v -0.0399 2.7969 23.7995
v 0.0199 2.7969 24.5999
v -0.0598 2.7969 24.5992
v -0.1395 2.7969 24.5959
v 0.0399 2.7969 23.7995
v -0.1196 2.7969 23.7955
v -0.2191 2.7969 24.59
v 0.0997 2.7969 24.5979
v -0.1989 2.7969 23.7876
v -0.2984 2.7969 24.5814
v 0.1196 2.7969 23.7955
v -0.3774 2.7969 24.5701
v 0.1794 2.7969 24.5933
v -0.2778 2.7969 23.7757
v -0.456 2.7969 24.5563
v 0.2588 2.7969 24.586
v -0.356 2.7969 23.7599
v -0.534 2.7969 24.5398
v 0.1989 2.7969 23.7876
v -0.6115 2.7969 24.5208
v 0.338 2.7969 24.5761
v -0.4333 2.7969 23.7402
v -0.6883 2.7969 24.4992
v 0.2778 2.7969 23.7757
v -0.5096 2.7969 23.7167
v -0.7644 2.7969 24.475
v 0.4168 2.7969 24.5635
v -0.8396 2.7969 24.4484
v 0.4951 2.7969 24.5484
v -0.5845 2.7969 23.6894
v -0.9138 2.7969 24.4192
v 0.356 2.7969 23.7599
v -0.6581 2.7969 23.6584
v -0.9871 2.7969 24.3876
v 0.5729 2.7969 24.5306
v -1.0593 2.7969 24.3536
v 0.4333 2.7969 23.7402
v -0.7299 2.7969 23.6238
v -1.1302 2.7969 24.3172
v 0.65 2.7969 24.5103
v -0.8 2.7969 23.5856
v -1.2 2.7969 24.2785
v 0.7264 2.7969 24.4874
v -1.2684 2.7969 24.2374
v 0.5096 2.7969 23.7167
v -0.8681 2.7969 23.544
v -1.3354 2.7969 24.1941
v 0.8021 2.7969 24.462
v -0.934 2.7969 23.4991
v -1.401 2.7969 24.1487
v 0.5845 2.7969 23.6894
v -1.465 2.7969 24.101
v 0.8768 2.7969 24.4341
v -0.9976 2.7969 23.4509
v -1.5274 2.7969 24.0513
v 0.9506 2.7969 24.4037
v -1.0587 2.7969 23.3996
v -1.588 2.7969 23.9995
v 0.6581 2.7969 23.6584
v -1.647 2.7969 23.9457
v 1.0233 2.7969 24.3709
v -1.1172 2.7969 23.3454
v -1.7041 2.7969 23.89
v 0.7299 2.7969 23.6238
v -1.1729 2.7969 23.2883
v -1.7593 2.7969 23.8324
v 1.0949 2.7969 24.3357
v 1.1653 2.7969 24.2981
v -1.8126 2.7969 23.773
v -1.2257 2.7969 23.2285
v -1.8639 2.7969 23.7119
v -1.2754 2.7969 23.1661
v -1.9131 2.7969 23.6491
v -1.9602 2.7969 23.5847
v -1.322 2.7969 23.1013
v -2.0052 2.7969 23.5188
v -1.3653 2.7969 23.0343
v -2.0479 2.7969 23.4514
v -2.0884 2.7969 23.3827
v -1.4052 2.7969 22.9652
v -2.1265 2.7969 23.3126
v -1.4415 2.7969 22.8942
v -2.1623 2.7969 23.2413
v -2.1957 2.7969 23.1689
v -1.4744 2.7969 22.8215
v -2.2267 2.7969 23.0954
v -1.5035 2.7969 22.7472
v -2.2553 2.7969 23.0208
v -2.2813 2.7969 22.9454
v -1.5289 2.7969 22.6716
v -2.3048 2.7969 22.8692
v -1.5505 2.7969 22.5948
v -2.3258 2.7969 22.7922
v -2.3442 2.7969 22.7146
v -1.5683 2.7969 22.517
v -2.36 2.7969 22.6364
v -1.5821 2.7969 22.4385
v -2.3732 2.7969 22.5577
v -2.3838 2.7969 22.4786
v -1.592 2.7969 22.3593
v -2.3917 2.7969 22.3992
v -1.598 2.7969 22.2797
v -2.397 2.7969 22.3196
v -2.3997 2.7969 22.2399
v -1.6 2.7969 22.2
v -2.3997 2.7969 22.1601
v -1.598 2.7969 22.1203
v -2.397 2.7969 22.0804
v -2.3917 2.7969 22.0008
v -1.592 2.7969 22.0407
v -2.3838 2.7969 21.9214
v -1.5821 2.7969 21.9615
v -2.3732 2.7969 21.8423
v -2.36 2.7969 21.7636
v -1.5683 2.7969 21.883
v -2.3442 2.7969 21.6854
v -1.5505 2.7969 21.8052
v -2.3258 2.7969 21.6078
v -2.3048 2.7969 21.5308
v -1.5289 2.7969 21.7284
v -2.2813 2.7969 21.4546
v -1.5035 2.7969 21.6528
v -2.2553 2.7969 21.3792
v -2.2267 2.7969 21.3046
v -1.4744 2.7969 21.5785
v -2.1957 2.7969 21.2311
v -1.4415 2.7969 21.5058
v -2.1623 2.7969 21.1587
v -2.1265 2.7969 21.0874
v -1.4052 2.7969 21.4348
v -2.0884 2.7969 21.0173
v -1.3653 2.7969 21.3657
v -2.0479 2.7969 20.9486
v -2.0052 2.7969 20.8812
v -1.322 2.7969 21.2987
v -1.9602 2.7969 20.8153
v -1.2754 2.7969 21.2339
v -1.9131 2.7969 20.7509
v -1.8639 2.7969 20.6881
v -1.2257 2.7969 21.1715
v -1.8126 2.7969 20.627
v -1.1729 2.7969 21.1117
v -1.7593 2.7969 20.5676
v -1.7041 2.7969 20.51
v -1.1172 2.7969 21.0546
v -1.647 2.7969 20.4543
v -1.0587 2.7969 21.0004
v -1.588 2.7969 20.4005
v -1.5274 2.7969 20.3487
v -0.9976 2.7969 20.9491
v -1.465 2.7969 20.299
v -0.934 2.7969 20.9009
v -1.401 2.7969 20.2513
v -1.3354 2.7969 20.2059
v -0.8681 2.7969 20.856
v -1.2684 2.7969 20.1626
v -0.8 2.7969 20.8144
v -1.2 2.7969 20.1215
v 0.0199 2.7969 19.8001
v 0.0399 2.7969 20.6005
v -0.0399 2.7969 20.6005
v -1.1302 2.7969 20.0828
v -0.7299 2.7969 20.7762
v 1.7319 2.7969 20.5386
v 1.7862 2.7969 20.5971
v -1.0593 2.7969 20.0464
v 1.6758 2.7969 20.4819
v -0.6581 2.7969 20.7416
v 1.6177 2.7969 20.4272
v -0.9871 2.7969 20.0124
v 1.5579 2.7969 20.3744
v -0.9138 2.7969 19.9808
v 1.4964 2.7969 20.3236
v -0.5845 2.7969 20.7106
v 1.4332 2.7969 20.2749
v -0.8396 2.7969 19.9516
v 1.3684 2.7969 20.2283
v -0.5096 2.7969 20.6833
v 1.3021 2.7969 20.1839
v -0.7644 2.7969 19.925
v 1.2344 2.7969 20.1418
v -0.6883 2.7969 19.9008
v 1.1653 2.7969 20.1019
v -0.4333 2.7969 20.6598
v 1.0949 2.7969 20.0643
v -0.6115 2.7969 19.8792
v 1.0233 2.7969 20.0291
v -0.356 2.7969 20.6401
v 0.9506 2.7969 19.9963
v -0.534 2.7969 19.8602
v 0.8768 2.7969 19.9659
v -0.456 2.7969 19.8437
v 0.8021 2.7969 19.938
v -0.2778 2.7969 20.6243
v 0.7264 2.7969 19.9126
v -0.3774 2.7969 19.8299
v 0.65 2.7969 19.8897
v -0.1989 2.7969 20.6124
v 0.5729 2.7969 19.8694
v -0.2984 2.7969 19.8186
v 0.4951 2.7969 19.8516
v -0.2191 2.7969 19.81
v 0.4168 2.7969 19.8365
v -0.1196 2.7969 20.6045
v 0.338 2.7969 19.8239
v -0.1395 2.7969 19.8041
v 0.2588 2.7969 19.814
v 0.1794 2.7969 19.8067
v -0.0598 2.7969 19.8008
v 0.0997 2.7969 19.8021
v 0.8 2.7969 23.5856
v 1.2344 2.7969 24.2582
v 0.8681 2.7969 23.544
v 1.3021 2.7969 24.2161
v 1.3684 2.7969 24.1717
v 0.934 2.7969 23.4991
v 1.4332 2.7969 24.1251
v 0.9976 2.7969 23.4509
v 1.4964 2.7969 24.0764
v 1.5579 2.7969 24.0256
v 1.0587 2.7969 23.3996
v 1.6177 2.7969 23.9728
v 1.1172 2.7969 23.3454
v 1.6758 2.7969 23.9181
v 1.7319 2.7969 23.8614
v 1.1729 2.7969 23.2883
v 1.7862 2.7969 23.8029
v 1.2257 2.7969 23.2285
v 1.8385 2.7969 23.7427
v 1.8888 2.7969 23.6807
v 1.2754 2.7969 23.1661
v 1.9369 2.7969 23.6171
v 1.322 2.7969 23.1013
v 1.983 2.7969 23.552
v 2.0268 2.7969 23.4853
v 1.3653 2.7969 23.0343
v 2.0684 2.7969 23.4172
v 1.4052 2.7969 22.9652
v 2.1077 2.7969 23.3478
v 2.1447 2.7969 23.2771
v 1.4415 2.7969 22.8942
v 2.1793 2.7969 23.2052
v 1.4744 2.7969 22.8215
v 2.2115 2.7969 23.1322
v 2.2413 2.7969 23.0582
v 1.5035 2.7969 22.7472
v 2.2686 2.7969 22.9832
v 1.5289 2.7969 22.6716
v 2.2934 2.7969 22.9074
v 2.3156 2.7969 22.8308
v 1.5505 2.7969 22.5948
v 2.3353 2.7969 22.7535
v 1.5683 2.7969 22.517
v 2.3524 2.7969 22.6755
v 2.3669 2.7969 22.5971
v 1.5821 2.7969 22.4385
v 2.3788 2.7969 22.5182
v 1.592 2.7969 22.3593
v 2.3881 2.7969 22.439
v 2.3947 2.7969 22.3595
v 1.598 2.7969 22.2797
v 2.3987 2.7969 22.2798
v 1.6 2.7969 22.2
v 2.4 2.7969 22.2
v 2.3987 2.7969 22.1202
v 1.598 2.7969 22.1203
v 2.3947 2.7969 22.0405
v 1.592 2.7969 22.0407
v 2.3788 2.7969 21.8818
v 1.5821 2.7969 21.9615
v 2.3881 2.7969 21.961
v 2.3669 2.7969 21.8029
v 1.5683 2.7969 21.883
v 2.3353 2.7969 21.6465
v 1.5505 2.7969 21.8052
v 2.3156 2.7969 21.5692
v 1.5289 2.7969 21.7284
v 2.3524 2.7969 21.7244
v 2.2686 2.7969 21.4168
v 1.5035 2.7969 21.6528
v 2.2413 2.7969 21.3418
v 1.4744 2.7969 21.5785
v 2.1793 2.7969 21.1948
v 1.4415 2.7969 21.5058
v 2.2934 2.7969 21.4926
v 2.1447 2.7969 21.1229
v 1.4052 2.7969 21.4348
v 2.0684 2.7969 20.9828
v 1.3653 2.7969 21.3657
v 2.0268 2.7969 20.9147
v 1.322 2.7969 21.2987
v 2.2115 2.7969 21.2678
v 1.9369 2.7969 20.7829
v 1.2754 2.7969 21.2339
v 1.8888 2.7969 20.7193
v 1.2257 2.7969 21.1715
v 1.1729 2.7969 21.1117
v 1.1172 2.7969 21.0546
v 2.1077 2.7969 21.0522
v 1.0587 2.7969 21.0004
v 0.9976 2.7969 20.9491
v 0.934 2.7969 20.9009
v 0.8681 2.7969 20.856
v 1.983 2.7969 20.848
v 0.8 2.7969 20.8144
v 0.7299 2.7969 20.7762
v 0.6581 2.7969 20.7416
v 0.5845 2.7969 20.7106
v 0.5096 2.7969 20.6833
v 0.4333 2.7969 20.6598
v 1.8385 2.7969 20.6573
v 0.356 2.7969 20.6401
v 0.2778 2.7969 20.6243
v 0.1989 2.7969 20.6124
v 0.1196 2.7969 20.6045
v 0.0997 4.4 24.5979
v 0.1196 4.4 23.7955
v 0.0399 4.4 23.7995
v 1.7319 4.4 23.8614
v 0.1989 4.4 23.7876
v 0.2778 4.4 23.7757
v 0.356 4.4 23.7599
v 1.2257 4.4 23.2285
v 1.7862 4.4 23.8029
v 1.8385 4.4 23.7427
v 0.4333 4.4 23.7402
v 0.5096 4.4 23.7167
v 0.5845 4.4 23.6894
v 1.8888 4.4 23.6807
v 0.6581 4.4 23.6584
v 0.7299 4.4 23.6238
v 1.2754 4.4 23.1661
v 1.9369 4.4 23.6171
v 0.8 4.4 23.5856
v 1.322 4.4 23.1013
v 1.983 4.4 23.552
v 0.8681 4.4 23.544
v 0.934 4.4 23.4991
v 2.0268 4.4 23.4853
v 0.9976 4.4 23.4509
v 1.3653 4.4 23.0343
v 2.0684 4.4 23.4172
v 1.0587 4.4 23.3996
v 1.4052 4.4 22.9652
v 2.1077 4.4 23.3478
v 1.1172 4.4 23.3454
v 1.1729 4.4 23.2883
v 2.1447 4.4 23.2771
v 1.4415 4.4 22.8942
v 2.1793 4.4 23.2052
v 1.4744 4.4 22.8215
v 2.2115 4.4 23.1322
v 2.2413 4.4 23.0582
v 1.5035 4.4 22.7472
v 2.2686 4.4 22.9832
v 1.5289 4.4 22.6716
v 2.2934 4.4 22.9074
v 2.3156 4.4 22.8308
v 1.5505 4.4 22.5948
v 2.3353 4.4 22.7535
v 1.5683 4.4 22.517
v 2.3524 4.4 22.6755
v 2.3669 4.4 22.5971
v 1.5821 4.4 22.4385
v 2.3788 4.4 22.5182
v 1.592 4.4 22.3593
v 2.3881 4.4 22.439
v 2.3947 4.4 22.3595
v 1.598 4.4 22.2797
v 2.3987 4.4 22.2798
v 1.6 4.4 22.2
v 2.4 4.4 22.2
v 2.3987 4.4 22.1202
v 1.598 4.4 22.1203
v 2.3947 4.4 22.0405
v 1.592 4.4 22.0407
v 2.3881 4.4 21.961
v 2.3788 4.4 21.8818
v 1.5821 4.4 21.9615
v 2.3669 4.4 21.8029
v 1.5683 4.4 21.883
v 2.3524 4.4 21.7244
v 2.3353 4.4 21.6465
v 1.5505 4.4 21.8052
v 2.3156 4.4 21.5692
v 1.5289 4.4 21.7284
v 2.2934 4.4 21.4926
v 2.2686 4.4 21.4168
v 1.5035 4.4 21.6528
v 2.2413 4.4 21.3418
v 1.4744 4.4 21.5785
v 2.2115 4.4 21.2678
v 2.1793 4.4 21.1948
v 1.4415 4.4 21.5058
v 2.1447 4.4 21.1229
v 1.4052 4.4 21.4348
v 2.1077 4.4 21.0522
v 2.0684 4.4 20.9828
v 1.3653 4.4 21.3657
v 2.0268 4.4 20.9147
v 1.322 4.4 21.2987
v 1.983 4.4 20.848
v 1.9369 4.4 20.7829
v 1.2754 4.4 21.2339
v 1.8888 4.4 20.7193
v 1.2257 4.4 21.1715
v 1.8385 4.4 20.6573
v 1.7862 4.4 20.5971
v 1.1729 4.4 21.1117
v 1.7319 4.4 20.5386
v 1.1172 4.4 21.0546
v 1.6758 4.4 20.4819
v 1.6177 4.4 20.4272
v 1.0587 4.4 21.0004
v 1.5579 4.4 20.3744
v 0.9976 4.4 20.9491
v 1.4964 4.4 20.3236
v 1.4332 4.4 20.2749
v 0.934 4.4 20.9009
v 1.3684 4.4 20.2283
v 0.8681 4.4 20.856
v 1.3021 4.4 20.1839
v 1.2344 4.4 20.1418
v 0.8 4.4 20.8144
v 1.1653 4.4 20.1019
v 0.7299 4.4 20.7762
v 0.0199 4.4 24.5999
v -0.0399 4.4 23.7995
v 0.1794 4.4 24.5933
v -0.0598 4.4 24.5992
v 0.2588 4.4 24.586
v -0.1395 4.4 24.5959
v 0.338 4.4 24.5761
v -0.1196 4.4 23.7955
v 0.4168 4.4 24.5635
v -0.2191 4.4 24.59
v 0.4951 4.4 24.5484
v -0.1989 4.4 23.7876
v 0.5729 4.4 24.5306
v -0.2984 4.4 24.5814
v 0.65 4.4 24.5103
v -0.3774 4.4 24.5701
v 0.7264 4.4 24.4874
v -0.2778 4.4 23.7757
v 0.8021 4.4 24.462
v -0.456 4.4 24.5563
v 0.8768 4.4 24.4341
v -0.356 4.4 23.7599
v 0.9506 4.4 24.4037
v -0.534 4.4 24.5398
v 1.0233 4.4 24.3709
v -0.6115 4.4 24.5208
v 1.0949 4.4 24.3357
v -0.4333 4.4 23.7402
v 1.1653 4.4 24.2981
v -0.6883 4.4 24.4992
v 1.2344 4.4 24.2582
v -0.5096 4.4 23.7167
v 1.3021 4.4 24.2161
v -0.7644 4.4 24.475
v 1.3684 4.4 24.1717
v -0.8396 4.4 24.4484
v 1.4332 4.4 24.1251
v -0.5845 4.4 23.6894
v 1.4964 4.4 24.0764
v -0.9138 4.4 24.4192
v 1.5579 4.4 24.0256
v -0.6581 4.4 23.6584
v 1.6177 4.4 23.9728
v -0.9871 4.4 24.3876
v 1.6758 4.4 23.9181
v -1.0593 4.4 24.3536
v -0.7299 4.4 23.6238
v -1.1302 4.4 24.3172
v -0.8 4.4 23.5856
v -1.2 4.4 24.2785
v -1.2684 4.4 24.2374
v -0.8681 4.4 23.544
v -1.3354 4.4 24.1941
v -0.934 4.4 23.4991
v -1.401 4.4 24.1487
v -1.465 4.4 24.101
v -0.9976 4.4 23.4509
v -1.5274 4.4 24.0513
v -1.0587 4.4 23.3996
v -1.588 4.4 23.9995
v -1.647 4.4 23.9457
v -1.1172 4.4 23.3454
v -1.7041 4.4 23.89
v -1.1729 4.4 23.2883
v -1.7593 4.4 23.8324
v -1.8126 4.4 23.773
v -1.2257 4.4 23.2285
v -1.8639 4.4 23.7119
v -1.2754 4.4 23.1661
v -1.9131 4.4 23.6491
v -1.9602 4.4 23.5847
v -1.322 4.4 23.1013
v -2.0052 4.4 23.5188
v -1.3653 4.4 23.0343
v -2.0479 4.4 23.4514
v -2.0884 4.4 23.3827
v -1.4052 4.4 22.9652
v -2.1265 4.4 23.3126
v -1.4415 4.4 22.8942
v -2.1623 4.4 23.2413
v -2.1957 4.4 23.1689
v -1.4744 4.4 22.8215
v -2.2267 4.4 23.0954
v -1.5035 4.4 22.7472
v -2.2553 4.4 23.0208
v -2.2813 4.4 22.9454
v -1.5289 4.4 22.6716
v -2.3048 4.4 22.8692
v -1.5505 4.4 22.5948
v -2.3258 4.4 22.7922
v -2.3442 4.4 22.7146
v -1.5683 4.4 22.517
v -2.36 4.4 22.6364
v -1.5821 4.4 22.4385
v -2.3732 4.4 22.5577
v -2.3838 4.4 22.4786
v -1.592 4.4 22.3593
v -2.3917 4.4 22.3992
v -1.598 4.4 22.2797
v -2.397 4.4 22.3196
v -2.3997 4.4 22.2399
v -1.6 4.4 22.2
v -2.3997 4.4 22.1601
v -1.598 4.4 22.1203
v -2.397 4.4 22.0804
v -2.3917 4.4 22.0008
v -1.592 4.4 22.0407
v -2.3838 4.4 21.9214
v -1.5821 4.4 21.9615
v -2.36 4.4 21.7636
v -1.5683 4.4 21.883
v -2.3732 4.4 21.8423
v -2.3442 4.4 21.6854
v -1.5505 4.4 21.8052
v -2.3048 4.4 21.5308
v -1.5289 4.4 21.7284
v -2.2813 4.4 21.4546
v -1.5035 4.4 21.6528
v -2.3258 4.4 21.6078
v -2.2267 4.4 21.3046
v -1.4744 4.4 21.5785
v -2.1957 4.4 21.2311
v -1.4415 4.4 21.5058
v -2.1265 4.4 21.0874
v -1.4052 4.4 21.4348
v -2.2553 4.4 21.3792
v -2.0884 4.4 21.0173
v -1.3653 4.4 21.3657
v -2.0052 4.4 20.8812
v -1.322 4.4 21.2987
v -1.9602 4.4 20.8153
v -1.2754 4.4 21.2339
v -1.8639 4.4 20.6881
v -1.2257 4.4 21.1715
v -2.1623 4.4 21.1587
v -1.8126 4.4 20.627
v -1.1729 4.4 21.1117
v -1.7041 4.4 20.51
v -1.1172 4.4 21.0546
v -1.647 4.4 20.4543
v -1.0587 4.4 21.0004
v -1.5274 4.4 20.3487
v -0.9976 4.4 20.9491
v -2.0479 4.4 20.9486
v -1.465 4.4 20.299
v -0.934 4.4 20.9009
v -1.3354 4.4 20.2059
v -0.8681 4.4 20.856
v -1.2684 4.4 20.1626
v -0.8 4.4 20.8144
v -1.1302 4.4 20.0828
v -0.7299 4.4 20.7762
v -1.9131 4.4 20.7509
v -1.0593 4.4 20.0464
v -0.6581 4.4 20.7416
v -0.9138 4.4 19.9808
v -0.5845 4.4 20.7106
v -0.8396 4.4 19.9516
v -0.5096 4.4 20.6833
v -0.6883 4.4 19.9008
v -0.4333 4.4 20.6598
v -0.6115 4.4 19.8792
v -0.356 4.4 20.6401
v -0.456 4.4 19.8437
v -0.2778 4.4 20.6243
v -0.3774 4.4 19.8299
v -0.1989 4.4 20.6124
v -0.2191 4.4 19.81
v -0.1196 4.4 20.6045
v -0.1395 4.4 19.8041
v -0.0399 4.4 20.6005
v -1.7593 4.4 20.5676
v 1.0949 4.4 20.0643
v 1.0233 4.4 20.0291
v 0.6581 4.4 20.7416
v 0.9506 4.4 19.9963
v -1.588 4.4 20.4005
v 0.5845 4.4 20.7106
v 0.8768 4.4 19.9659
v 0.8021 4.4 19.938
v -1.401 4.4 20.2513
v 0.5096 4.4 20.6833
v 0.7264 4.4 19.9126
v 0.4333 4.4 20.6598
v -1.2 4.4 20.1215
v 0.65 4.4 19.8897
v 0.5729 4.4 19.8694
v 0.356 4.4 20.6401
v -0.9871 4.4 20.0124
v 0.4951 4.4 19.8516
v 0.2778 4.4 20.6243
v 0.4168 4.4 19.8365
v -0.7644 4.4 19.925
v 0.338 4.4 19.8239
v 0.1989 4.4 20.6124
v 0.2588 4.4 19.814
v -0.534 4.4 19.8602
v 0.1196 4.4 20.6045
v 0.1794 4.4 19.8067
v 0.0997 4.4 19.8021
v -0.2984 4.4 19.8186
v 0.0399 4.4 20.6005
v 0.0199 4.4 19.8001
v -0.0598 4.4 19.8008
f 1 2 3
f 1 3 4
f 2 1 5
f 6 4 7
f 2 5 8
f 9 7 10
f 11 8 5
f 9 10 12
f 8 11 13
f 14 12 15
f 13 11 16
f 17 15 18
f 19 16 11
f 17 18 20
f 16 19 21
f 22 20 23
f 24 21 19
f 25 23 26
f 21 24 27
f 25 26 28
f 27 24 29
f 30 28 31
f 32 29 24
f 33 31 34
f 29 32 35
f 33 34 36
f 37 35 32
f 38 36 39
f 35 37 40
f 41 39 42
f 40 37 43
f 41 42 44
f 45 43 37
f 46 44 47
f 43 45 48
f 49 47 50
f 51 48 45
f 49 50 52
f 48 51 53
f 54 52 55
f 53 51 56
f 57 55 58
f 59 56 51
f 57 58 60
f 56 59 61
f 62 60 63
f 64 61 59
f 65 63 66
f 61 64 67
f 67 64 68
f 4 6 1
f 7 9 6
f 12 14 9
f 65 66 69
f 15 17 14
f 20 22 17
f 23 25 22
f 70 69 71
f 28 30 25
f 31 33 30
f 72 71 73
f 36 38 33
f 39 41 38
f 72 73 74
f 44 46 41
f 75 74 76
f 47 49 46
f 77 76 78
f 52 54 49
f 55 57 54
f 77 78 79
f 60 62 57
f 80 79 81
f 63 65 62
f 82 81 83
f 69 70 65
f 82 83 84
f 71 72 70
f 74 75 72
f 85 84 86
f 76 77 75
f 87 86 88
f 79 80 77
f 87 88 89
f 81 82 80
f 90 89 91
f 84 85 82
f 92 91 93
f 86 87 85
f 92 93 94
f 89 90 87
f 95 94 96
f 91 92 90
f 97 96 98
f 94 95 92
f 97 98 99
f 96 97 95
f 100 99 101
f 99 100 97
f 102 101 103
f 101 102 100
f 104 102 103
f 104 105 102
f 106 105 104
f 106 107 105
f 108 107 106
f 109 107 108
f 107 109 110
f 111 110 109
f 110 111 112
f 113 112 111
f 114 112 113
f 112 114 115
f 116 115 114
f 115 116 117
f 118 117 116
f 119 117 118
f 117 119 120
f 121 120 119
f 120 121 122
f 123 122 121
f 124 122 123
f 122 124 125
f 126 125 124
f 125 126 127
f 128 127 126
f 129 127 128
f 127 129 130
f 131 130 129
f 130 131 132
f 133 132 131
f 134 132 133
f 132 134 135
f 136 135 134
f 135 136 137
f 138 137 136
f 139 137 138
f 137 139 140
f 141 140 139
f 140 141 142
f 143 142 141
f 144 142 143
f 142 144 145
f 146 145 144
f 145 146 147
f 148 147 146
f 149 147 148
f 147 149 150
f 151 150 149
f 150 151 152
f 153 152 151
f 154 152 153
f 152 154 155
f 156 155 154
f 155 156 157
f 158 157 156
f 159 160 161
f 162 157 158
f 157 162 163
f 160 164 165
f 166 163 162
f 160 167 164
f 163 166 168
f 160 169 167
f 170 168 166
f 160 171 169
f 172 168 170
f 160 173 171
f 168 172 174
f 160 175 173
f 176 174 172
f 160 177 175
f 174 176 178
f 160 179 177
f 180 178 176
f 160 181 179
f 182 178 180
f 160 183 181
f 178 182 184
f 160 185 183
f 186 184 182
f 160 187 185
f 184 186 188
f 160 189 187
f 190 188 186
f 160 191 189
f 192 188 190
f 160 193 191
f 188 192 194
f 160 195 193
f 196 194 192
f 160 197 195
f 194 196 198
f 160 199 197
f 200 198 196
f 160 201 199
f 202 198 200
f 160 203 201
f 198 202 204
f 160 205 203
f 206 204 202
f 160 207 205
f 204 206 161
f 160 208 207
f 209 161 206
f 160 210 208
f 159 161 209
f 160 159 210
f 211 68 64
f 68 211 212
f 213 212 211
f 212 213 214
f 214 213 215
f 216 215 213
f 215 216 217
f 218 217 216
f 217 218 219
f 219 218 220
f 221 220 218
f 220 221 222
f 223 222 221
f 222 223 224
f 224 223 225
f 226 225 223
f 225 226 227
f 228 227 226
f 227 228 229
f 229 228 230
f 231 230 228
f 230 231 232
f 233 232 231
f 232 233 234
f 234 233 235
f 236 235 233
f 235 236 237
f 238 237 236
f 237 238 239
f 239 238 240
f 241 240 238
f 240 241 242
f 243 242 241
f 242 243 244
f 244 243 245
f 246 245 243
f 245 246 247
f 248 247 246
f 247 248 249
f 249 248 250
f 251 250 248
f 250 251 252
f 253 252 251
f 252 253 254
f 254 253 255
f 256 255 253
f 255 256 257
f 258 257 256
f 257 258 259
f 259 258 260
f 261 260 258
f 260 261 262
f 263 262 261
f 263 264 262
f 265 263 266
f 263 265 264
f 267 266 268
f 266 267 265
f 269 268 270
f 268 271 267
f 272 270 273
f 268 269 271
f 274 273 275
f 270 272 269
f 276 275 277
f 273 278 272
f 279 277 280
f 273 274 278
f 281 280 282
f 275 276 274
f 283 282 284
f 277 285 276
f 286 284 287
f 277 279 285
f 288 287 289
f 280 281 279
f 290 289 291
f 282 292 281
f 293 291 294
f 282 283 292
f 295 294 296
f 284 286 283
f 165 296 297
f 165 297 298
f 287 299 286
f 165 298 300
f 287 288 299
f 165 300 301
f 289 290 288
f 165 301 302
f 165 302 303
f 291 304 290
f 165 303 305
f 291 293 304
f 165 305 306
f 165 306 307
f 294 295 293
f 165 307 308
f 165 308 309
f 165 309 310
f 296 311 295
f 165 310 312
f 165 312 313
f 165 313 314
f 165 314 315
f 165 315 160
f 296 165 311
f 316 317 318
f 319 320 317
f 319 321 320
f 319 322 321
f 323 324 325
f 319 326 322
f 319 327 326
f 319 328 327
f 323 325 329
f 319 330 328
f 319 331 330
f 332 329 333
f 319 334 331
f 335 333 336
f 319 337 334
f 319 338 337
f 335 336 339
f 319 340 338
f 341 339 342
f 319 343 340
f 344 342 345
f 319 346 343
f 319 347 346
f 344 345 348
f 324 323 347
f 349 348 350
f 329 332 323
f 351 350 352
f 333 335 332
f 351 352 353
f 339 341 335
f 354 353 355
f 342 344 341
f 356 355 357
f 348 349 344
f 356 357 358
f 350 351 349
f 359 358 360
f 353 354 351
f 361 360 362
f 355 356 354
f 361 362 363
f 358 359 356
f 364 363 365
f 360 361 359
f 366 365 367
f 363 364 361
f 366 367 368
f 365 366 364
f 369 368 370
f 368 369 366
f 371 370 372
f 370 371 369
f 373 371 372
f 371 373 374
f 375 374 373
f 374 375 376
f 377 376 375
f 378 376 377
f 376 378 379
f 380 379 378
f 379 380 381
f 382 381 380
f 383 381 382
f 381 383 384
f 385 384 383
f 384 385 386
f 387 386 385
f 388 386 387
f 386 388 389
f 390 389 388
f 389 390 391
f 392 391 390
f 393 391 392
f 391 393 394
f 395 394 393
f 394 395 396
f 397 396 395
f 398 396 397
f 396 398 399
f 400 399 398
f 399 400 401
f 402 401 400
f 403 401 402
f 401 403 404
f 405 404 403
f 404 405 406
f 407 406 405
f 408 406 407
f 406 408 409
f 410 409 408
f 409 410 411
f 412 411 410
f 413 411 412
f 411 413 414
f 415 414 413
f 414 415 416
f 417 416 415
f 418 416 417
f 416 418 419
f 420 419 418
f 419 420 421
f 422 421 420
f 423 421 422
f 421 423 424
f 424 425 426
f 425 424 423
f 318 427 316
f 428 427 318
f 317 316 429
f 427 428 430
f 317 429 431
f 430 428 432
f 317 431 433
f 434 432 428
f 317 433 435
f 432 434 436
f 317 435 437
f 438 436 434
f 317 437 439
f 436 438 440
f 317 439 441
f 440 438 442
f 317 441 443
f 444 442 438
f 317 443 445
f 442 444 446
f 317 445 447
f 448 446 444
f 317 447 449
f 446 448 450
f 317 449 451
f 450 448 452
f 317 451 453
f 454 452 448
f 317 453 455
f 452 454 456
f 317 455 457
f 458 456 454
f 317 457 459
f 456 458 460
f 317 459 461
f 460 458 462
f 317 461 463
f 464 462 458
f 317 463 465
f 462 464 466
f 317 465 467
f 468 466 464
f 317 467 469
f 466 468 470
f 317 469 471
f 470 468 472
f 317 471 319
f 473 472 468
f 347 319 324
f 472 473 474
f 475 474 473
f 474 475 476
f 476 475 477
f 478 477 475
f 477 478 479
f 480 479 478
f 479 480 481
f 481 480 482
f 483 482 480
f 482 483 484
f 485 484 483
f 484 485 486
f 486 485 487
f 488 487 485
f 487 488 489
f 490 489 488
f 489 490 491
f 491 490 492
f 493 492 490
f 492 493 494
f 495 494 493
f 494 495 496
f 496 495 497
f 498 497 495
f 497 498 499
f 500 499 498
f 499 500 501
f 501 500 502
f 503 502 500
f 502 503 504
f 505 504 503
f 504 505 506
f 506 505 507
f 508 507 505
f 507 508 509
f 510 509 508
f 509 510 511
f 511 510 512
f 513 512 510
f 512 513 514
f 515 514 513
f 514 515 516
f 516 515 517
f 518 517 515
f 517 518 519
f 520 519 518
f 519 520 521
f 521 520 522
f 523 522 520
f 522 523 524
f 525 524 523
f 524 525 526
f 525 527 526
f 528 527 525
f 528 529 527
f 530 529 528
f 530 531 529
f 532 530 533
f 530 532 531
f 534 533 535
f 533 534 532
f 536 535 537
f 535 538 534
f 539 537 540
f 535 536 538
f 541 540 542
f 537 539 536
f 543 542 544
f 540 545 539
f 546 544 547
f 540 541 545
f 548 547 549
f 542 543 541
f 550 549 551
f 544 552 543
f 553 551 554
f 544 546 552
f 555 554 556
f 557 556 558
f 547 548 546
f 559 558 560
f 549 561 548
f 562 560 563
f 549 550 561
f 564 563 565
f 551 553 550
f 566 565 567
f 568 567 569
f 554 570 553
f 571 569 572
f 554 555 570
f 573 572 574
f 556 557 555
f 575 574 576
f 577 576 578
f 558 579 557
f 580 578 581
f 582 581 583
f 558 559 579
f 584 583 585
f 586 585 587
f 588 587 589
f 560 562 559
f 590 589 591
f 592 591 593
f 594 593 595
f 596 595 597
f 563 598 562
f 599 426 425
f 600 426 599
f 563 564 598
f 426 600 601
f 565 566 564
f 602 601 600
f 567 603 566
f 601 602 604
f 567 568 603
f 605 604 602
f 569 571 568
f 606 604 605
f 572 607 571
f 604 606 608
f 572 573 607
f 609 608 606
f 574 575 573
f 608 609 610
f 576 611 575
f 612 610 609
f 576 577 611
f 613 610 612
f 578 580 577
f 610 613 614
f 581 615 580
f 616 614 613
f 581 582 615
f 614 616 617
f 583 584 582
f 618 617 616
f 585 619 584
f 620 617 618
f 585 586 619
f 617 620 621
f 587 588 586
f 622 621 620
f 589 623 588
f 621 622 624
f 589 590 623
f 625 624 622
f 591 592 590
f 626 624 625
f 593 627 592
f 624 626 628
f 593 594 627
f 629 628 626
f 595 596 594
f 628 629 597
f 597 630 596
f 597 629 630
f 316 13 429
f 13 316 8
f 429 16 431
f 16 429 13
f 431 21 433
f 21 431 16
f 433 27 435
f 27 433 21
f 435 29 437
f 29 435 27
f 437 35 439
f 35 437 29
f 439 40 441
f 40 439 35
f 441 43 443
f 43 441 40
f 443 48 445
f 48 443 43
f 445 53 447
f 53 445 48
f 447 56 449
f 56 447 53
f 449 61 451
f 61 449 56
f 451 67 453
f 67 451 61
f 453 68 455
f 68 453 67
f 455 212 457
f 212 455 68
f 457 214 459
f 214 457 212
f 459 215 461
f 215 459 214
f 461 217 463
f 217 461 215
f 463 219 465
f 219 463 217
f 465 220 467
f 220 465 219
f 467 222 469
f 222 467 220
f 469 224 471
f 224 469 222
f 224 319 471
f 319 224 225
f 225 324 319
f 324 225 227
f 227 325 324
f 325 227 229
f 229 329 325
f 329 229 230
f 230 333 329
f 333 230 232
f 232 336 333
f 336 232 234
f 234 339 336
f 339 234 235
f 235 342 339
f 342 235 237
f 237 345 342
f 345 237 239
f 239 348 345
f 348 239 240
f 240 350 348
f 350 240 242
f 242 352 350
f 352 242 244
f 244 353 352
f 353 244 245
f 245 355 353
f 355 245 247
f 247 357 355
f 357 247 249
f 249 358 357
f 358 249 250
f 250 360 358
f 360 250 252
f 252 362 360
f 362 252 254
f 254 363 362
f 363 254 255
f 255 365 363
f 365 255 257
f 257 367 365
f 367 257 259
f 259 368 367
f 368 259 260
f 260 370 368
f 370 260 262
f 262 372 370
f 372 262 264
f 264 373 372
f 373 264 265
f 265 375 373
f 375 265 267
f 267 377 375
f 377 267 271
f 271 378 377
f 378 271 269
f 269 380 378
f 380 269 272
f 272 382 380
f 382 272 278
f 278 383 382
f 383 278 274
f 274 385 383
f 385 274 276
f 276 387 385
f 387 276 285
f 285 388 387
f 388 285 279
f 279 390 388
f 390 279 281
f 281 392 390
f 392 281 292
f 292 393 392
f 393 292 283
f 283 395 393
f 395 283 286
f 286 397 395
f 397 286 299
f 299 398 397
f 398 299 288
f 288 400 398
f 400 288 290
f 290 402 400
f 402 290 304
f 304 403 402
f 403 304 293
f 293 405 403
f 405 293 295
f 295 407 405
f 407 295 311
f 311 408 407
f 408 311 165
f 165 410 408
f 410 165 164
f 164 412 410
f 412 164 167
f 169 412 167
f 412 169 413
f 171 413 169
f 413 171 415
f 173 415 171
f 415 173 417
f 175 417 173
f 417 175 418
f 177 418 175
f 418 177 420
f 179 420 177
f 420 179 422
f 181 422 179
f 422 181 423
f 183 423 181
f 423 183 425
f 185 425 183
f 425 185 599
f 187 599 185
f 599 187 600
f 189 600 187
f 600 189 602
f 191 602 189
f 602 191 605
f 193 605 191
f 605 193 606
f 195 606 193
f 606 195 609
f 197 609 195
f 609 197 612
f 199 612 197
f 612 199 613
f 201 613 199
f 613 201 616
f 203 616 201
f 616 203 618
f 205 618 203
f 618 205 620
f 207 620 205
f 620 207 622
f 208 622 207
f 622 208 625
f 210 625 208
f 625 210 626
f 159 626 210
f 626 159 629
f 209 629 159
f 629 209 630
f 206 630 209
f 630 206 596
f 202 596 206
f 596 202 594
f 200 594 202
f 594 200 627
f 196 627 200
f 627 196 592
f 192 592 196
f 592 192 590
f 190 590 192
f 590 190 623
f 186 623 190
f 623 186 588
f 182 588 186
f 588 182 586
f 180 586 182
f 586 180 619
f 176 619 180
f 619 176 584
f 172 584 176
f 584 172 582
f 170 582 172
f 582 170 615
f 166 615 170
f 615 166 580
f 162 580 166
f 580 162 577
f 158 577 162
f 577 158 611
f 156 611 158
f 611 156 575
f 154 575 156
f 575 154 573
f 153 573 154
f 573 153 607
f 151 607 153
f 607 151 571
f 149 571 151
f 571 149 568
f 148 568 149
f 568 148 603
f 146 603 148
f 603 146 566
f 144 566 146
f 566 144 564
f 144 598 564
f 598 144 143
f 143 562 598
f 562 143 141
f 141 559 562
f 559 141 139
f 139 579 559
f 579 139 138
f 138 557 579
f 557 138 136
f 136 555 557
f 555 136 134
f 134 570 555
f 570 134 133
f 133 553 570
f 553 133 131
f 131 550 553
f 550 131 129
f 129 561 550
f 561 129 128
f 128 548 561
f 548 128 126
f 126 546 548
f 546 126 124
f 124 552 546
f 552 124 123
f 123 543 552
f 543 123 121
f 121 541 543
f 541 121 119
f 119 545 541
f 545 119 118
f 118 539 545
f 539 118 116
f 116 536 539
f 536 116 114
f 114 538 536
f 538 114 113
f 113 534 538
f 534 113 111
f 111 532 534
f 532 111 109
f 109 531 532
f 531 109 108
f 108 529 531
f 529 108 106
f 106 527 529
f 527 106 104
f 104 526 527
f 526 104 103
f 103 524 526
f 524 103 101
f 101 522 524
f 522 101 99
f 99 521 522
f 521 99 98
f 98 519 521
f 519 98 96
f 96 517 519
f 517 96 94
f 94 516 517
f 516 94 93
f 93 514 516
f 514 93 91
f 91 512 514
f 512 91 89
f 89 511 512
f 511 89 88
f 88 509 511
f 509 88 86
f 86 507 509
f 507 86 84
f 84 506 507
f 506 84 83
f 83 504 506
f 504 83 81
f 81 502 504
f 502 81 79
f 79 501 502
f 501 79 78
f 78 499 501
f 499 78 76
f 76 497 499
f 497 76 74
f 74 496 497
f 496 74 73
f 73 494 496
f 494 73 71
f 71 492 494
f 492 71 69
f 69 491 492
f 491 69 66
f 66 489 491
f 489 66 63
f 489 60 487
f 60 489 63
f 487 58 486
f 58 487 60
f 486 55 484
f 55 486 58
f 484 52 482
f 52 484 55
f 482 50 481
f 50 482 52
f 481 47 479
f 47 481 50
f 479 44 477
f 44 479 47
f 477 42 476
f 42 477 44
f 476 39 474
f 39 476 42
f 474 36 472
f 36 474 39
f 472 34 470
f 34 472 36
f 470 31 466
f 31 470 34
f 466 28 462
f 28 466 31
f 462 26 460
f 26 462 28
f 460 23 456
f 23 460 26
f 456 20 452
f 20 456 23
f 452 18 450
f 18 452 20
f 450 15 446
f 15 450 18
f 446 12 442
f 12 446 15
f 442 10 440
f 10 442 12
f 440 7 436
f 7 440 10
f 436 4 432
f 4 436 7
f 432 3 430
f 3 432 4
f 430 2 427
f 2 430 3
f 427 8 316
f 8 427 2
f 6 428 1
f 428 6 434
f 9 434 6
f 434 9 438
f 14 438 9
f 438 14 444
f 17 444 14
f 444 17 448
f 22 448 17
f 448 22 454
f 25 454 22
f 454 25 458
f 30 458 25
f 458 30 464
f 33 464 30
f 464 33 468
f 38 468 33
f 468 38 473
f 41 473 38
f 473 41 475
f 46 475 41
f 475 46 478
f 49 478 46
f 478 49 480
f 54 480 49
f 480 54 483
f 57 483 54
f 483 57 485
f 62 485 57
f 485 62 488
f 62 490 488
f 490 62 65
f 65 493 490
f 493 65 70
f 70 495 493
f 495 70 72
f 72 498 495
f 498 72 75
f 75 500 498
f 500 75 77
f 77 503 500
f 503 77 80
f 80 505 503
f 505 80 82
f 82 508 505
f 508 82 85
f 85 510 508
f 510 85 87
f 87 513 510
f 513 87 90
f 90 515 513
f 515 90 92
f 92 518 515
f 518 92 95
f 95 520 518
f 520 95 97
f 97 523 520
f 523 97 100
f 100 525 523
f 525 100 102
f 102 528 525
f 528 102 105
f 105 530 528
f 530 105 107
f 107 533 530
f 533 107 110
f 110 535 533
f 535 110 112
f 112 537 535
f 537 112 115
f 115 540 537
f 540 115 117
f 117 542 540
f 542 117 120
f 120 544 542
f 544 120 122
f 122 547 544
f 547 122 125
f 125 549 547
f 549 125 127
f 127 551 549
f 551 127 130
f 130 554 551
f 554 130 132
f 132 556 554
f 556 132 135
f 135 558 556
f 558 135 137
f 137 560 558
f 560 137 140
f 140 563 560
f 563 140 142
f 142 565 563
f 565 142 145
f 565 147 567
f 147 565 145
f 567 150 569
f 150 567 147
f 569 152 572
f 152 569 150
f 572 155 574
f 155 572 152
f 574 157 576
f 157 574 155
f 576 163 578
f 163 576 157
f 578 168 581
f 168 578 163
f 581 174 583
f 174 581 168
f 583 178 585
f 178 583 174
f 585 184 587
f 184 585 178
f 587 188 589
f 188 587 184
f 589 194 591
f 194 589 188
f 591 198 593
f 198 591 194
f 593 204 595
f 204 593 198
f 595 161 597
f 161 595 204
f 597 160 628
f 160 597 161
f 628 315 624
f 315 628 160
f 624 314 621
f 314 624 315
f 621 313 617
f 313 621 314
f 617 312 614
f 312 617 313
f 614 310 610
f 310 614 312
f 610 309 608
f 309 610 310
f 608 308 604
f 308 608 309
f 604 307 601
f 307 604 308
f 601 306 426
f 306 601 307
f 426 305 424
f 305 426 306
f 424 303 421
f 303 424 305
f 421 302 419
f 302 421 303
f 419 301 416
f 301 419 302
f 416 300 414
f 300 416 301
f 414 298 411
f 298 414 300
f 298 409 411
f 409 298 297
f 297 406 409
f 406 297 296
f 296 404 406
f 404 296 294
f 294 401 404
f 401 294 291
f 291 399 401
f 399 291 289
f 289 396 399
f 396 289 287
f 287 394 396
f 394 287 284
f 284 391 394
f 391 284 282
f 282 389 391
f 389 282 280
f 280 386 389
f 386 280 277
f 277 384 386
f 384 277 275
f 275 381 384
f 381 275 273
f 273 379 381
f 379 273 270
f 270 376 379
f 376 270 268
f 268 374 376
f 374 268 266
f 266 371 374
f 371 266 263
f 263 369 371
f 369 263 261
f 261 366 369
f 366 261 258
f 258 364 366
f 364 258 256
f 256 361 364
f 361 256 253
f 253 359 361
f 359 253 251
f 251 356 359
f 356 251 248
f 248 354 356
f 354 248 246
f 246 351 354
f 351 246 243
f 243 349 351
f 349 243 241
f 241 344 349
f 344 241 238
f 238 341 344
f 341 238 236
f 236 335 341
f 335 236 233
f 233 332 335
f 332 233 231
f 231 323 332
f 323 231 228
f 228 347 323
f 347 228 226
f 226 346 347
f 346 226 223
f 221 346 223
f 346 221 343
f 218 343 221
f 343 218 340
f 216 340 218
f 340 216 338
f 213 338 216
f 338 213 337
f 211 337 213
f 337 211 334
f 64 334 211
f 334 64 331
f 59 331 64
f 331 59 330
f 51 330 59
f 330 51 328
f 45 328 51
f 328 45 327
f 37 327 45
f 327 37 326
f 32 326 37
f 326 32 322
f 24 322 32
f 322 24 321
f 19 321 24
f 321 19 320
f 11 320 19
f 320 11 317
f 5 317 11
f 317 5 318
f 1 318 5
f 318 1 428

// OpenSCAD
use <../lib.scad>
use <30375.scad>
use <30376.scad>
use <30377.scad>
use <30378.scad>
$fa=1; $fs=0.2;
function ldraw_lib__30375cs0(realsolid=false) = [
// 0 Minifig Mechanical SW Battle Droid (Shortcut)
// 0 Name: 30375cs0.dat
// 0 Author: Franklin W. Cain [fwcain]
// 0 !LDRAW_ORG Shortcut UPDATE 2003-03
// 0 !LICENSE Licensed under CC BY 2.0 and CC BY 4.0 : see CAreadme.txt
// 
// 0 BFC CERTIFY CCW
  [0,"BFC","CERTIFY"],
  [0,"BFC","CCW"],
// 
// 0 !KEYWORDS battle droid, Episode One, Episode Two, minifig, minifig-scale
// 0 !KEYWORDS Star Wars, Trade Federation
// 
// 0 !CMDLINE -c487
// 
// 0 !HISTORY 2003-12-19 [PTadmin] Official Update 2003-03
// 0 !HISTORY 2007-10-12 [PTadmin] Header formatted for Contributor Agreement
// 0 !HISTORY 2008-07-01 [PTadmin] Official Update 2008-01
// 
// 
// 0 // Un-Comment this line for "backpack":
// 0 // 1 16 0 -65.5 15 0 0 1 1 0 0 0 -1 0 3023.dat
// 
// 1 16 0 0 0 1 0 0 0 1 0 0 0 1 30376.dat
  [1,16,0,0,0,1,0,0,0,1,0,0,0,1, ldraw_lib__30376(realsolid)],
// 1 16 0 -38 0 1 0 0 0 1 0 0 0 1 30375.dat
  [1,16,0,-38,0,1,0,0,0,1,0,0,0,1, ldraw_lib__30375(realsolid)],
// 1 16 0 -70 0 1 0 0 0 1 0 0 0 1 30378.dat
  [1,16,0,-70,0,1,0,0,0,1,0,0,0,1, ldraw_lib__30378(realsolid)],
// 1 16 -16 -70 0 1 0 0 0 1 0 0 0 1 30377.dat
  [1,16,-16,-70,0,1,0,0,0,1,0,0,0,1, ldraw_lib__30377(realsolid)],
// 1 16 16 -70 0 1 0 0 0 1 0 0 0 1 30377.dat
  [1,16,16,-70,0,1,0,0,0,1,0,0,0,1, ldraw_lib__30377(realsolid)],
// 0
// 0 COMMENT end of file
];
module ldraw_lib__30375cs0(step=0, col=false, unit=2/5, alt=false, line=0.2, solid=!$preview)
    makepoly(ldraw_lib__30375cs0(solid), step=step, col=col, unit=unit, alt=alt, line=line, solid=solid);
ldraw_lib__30375cs0(line=0.2);
